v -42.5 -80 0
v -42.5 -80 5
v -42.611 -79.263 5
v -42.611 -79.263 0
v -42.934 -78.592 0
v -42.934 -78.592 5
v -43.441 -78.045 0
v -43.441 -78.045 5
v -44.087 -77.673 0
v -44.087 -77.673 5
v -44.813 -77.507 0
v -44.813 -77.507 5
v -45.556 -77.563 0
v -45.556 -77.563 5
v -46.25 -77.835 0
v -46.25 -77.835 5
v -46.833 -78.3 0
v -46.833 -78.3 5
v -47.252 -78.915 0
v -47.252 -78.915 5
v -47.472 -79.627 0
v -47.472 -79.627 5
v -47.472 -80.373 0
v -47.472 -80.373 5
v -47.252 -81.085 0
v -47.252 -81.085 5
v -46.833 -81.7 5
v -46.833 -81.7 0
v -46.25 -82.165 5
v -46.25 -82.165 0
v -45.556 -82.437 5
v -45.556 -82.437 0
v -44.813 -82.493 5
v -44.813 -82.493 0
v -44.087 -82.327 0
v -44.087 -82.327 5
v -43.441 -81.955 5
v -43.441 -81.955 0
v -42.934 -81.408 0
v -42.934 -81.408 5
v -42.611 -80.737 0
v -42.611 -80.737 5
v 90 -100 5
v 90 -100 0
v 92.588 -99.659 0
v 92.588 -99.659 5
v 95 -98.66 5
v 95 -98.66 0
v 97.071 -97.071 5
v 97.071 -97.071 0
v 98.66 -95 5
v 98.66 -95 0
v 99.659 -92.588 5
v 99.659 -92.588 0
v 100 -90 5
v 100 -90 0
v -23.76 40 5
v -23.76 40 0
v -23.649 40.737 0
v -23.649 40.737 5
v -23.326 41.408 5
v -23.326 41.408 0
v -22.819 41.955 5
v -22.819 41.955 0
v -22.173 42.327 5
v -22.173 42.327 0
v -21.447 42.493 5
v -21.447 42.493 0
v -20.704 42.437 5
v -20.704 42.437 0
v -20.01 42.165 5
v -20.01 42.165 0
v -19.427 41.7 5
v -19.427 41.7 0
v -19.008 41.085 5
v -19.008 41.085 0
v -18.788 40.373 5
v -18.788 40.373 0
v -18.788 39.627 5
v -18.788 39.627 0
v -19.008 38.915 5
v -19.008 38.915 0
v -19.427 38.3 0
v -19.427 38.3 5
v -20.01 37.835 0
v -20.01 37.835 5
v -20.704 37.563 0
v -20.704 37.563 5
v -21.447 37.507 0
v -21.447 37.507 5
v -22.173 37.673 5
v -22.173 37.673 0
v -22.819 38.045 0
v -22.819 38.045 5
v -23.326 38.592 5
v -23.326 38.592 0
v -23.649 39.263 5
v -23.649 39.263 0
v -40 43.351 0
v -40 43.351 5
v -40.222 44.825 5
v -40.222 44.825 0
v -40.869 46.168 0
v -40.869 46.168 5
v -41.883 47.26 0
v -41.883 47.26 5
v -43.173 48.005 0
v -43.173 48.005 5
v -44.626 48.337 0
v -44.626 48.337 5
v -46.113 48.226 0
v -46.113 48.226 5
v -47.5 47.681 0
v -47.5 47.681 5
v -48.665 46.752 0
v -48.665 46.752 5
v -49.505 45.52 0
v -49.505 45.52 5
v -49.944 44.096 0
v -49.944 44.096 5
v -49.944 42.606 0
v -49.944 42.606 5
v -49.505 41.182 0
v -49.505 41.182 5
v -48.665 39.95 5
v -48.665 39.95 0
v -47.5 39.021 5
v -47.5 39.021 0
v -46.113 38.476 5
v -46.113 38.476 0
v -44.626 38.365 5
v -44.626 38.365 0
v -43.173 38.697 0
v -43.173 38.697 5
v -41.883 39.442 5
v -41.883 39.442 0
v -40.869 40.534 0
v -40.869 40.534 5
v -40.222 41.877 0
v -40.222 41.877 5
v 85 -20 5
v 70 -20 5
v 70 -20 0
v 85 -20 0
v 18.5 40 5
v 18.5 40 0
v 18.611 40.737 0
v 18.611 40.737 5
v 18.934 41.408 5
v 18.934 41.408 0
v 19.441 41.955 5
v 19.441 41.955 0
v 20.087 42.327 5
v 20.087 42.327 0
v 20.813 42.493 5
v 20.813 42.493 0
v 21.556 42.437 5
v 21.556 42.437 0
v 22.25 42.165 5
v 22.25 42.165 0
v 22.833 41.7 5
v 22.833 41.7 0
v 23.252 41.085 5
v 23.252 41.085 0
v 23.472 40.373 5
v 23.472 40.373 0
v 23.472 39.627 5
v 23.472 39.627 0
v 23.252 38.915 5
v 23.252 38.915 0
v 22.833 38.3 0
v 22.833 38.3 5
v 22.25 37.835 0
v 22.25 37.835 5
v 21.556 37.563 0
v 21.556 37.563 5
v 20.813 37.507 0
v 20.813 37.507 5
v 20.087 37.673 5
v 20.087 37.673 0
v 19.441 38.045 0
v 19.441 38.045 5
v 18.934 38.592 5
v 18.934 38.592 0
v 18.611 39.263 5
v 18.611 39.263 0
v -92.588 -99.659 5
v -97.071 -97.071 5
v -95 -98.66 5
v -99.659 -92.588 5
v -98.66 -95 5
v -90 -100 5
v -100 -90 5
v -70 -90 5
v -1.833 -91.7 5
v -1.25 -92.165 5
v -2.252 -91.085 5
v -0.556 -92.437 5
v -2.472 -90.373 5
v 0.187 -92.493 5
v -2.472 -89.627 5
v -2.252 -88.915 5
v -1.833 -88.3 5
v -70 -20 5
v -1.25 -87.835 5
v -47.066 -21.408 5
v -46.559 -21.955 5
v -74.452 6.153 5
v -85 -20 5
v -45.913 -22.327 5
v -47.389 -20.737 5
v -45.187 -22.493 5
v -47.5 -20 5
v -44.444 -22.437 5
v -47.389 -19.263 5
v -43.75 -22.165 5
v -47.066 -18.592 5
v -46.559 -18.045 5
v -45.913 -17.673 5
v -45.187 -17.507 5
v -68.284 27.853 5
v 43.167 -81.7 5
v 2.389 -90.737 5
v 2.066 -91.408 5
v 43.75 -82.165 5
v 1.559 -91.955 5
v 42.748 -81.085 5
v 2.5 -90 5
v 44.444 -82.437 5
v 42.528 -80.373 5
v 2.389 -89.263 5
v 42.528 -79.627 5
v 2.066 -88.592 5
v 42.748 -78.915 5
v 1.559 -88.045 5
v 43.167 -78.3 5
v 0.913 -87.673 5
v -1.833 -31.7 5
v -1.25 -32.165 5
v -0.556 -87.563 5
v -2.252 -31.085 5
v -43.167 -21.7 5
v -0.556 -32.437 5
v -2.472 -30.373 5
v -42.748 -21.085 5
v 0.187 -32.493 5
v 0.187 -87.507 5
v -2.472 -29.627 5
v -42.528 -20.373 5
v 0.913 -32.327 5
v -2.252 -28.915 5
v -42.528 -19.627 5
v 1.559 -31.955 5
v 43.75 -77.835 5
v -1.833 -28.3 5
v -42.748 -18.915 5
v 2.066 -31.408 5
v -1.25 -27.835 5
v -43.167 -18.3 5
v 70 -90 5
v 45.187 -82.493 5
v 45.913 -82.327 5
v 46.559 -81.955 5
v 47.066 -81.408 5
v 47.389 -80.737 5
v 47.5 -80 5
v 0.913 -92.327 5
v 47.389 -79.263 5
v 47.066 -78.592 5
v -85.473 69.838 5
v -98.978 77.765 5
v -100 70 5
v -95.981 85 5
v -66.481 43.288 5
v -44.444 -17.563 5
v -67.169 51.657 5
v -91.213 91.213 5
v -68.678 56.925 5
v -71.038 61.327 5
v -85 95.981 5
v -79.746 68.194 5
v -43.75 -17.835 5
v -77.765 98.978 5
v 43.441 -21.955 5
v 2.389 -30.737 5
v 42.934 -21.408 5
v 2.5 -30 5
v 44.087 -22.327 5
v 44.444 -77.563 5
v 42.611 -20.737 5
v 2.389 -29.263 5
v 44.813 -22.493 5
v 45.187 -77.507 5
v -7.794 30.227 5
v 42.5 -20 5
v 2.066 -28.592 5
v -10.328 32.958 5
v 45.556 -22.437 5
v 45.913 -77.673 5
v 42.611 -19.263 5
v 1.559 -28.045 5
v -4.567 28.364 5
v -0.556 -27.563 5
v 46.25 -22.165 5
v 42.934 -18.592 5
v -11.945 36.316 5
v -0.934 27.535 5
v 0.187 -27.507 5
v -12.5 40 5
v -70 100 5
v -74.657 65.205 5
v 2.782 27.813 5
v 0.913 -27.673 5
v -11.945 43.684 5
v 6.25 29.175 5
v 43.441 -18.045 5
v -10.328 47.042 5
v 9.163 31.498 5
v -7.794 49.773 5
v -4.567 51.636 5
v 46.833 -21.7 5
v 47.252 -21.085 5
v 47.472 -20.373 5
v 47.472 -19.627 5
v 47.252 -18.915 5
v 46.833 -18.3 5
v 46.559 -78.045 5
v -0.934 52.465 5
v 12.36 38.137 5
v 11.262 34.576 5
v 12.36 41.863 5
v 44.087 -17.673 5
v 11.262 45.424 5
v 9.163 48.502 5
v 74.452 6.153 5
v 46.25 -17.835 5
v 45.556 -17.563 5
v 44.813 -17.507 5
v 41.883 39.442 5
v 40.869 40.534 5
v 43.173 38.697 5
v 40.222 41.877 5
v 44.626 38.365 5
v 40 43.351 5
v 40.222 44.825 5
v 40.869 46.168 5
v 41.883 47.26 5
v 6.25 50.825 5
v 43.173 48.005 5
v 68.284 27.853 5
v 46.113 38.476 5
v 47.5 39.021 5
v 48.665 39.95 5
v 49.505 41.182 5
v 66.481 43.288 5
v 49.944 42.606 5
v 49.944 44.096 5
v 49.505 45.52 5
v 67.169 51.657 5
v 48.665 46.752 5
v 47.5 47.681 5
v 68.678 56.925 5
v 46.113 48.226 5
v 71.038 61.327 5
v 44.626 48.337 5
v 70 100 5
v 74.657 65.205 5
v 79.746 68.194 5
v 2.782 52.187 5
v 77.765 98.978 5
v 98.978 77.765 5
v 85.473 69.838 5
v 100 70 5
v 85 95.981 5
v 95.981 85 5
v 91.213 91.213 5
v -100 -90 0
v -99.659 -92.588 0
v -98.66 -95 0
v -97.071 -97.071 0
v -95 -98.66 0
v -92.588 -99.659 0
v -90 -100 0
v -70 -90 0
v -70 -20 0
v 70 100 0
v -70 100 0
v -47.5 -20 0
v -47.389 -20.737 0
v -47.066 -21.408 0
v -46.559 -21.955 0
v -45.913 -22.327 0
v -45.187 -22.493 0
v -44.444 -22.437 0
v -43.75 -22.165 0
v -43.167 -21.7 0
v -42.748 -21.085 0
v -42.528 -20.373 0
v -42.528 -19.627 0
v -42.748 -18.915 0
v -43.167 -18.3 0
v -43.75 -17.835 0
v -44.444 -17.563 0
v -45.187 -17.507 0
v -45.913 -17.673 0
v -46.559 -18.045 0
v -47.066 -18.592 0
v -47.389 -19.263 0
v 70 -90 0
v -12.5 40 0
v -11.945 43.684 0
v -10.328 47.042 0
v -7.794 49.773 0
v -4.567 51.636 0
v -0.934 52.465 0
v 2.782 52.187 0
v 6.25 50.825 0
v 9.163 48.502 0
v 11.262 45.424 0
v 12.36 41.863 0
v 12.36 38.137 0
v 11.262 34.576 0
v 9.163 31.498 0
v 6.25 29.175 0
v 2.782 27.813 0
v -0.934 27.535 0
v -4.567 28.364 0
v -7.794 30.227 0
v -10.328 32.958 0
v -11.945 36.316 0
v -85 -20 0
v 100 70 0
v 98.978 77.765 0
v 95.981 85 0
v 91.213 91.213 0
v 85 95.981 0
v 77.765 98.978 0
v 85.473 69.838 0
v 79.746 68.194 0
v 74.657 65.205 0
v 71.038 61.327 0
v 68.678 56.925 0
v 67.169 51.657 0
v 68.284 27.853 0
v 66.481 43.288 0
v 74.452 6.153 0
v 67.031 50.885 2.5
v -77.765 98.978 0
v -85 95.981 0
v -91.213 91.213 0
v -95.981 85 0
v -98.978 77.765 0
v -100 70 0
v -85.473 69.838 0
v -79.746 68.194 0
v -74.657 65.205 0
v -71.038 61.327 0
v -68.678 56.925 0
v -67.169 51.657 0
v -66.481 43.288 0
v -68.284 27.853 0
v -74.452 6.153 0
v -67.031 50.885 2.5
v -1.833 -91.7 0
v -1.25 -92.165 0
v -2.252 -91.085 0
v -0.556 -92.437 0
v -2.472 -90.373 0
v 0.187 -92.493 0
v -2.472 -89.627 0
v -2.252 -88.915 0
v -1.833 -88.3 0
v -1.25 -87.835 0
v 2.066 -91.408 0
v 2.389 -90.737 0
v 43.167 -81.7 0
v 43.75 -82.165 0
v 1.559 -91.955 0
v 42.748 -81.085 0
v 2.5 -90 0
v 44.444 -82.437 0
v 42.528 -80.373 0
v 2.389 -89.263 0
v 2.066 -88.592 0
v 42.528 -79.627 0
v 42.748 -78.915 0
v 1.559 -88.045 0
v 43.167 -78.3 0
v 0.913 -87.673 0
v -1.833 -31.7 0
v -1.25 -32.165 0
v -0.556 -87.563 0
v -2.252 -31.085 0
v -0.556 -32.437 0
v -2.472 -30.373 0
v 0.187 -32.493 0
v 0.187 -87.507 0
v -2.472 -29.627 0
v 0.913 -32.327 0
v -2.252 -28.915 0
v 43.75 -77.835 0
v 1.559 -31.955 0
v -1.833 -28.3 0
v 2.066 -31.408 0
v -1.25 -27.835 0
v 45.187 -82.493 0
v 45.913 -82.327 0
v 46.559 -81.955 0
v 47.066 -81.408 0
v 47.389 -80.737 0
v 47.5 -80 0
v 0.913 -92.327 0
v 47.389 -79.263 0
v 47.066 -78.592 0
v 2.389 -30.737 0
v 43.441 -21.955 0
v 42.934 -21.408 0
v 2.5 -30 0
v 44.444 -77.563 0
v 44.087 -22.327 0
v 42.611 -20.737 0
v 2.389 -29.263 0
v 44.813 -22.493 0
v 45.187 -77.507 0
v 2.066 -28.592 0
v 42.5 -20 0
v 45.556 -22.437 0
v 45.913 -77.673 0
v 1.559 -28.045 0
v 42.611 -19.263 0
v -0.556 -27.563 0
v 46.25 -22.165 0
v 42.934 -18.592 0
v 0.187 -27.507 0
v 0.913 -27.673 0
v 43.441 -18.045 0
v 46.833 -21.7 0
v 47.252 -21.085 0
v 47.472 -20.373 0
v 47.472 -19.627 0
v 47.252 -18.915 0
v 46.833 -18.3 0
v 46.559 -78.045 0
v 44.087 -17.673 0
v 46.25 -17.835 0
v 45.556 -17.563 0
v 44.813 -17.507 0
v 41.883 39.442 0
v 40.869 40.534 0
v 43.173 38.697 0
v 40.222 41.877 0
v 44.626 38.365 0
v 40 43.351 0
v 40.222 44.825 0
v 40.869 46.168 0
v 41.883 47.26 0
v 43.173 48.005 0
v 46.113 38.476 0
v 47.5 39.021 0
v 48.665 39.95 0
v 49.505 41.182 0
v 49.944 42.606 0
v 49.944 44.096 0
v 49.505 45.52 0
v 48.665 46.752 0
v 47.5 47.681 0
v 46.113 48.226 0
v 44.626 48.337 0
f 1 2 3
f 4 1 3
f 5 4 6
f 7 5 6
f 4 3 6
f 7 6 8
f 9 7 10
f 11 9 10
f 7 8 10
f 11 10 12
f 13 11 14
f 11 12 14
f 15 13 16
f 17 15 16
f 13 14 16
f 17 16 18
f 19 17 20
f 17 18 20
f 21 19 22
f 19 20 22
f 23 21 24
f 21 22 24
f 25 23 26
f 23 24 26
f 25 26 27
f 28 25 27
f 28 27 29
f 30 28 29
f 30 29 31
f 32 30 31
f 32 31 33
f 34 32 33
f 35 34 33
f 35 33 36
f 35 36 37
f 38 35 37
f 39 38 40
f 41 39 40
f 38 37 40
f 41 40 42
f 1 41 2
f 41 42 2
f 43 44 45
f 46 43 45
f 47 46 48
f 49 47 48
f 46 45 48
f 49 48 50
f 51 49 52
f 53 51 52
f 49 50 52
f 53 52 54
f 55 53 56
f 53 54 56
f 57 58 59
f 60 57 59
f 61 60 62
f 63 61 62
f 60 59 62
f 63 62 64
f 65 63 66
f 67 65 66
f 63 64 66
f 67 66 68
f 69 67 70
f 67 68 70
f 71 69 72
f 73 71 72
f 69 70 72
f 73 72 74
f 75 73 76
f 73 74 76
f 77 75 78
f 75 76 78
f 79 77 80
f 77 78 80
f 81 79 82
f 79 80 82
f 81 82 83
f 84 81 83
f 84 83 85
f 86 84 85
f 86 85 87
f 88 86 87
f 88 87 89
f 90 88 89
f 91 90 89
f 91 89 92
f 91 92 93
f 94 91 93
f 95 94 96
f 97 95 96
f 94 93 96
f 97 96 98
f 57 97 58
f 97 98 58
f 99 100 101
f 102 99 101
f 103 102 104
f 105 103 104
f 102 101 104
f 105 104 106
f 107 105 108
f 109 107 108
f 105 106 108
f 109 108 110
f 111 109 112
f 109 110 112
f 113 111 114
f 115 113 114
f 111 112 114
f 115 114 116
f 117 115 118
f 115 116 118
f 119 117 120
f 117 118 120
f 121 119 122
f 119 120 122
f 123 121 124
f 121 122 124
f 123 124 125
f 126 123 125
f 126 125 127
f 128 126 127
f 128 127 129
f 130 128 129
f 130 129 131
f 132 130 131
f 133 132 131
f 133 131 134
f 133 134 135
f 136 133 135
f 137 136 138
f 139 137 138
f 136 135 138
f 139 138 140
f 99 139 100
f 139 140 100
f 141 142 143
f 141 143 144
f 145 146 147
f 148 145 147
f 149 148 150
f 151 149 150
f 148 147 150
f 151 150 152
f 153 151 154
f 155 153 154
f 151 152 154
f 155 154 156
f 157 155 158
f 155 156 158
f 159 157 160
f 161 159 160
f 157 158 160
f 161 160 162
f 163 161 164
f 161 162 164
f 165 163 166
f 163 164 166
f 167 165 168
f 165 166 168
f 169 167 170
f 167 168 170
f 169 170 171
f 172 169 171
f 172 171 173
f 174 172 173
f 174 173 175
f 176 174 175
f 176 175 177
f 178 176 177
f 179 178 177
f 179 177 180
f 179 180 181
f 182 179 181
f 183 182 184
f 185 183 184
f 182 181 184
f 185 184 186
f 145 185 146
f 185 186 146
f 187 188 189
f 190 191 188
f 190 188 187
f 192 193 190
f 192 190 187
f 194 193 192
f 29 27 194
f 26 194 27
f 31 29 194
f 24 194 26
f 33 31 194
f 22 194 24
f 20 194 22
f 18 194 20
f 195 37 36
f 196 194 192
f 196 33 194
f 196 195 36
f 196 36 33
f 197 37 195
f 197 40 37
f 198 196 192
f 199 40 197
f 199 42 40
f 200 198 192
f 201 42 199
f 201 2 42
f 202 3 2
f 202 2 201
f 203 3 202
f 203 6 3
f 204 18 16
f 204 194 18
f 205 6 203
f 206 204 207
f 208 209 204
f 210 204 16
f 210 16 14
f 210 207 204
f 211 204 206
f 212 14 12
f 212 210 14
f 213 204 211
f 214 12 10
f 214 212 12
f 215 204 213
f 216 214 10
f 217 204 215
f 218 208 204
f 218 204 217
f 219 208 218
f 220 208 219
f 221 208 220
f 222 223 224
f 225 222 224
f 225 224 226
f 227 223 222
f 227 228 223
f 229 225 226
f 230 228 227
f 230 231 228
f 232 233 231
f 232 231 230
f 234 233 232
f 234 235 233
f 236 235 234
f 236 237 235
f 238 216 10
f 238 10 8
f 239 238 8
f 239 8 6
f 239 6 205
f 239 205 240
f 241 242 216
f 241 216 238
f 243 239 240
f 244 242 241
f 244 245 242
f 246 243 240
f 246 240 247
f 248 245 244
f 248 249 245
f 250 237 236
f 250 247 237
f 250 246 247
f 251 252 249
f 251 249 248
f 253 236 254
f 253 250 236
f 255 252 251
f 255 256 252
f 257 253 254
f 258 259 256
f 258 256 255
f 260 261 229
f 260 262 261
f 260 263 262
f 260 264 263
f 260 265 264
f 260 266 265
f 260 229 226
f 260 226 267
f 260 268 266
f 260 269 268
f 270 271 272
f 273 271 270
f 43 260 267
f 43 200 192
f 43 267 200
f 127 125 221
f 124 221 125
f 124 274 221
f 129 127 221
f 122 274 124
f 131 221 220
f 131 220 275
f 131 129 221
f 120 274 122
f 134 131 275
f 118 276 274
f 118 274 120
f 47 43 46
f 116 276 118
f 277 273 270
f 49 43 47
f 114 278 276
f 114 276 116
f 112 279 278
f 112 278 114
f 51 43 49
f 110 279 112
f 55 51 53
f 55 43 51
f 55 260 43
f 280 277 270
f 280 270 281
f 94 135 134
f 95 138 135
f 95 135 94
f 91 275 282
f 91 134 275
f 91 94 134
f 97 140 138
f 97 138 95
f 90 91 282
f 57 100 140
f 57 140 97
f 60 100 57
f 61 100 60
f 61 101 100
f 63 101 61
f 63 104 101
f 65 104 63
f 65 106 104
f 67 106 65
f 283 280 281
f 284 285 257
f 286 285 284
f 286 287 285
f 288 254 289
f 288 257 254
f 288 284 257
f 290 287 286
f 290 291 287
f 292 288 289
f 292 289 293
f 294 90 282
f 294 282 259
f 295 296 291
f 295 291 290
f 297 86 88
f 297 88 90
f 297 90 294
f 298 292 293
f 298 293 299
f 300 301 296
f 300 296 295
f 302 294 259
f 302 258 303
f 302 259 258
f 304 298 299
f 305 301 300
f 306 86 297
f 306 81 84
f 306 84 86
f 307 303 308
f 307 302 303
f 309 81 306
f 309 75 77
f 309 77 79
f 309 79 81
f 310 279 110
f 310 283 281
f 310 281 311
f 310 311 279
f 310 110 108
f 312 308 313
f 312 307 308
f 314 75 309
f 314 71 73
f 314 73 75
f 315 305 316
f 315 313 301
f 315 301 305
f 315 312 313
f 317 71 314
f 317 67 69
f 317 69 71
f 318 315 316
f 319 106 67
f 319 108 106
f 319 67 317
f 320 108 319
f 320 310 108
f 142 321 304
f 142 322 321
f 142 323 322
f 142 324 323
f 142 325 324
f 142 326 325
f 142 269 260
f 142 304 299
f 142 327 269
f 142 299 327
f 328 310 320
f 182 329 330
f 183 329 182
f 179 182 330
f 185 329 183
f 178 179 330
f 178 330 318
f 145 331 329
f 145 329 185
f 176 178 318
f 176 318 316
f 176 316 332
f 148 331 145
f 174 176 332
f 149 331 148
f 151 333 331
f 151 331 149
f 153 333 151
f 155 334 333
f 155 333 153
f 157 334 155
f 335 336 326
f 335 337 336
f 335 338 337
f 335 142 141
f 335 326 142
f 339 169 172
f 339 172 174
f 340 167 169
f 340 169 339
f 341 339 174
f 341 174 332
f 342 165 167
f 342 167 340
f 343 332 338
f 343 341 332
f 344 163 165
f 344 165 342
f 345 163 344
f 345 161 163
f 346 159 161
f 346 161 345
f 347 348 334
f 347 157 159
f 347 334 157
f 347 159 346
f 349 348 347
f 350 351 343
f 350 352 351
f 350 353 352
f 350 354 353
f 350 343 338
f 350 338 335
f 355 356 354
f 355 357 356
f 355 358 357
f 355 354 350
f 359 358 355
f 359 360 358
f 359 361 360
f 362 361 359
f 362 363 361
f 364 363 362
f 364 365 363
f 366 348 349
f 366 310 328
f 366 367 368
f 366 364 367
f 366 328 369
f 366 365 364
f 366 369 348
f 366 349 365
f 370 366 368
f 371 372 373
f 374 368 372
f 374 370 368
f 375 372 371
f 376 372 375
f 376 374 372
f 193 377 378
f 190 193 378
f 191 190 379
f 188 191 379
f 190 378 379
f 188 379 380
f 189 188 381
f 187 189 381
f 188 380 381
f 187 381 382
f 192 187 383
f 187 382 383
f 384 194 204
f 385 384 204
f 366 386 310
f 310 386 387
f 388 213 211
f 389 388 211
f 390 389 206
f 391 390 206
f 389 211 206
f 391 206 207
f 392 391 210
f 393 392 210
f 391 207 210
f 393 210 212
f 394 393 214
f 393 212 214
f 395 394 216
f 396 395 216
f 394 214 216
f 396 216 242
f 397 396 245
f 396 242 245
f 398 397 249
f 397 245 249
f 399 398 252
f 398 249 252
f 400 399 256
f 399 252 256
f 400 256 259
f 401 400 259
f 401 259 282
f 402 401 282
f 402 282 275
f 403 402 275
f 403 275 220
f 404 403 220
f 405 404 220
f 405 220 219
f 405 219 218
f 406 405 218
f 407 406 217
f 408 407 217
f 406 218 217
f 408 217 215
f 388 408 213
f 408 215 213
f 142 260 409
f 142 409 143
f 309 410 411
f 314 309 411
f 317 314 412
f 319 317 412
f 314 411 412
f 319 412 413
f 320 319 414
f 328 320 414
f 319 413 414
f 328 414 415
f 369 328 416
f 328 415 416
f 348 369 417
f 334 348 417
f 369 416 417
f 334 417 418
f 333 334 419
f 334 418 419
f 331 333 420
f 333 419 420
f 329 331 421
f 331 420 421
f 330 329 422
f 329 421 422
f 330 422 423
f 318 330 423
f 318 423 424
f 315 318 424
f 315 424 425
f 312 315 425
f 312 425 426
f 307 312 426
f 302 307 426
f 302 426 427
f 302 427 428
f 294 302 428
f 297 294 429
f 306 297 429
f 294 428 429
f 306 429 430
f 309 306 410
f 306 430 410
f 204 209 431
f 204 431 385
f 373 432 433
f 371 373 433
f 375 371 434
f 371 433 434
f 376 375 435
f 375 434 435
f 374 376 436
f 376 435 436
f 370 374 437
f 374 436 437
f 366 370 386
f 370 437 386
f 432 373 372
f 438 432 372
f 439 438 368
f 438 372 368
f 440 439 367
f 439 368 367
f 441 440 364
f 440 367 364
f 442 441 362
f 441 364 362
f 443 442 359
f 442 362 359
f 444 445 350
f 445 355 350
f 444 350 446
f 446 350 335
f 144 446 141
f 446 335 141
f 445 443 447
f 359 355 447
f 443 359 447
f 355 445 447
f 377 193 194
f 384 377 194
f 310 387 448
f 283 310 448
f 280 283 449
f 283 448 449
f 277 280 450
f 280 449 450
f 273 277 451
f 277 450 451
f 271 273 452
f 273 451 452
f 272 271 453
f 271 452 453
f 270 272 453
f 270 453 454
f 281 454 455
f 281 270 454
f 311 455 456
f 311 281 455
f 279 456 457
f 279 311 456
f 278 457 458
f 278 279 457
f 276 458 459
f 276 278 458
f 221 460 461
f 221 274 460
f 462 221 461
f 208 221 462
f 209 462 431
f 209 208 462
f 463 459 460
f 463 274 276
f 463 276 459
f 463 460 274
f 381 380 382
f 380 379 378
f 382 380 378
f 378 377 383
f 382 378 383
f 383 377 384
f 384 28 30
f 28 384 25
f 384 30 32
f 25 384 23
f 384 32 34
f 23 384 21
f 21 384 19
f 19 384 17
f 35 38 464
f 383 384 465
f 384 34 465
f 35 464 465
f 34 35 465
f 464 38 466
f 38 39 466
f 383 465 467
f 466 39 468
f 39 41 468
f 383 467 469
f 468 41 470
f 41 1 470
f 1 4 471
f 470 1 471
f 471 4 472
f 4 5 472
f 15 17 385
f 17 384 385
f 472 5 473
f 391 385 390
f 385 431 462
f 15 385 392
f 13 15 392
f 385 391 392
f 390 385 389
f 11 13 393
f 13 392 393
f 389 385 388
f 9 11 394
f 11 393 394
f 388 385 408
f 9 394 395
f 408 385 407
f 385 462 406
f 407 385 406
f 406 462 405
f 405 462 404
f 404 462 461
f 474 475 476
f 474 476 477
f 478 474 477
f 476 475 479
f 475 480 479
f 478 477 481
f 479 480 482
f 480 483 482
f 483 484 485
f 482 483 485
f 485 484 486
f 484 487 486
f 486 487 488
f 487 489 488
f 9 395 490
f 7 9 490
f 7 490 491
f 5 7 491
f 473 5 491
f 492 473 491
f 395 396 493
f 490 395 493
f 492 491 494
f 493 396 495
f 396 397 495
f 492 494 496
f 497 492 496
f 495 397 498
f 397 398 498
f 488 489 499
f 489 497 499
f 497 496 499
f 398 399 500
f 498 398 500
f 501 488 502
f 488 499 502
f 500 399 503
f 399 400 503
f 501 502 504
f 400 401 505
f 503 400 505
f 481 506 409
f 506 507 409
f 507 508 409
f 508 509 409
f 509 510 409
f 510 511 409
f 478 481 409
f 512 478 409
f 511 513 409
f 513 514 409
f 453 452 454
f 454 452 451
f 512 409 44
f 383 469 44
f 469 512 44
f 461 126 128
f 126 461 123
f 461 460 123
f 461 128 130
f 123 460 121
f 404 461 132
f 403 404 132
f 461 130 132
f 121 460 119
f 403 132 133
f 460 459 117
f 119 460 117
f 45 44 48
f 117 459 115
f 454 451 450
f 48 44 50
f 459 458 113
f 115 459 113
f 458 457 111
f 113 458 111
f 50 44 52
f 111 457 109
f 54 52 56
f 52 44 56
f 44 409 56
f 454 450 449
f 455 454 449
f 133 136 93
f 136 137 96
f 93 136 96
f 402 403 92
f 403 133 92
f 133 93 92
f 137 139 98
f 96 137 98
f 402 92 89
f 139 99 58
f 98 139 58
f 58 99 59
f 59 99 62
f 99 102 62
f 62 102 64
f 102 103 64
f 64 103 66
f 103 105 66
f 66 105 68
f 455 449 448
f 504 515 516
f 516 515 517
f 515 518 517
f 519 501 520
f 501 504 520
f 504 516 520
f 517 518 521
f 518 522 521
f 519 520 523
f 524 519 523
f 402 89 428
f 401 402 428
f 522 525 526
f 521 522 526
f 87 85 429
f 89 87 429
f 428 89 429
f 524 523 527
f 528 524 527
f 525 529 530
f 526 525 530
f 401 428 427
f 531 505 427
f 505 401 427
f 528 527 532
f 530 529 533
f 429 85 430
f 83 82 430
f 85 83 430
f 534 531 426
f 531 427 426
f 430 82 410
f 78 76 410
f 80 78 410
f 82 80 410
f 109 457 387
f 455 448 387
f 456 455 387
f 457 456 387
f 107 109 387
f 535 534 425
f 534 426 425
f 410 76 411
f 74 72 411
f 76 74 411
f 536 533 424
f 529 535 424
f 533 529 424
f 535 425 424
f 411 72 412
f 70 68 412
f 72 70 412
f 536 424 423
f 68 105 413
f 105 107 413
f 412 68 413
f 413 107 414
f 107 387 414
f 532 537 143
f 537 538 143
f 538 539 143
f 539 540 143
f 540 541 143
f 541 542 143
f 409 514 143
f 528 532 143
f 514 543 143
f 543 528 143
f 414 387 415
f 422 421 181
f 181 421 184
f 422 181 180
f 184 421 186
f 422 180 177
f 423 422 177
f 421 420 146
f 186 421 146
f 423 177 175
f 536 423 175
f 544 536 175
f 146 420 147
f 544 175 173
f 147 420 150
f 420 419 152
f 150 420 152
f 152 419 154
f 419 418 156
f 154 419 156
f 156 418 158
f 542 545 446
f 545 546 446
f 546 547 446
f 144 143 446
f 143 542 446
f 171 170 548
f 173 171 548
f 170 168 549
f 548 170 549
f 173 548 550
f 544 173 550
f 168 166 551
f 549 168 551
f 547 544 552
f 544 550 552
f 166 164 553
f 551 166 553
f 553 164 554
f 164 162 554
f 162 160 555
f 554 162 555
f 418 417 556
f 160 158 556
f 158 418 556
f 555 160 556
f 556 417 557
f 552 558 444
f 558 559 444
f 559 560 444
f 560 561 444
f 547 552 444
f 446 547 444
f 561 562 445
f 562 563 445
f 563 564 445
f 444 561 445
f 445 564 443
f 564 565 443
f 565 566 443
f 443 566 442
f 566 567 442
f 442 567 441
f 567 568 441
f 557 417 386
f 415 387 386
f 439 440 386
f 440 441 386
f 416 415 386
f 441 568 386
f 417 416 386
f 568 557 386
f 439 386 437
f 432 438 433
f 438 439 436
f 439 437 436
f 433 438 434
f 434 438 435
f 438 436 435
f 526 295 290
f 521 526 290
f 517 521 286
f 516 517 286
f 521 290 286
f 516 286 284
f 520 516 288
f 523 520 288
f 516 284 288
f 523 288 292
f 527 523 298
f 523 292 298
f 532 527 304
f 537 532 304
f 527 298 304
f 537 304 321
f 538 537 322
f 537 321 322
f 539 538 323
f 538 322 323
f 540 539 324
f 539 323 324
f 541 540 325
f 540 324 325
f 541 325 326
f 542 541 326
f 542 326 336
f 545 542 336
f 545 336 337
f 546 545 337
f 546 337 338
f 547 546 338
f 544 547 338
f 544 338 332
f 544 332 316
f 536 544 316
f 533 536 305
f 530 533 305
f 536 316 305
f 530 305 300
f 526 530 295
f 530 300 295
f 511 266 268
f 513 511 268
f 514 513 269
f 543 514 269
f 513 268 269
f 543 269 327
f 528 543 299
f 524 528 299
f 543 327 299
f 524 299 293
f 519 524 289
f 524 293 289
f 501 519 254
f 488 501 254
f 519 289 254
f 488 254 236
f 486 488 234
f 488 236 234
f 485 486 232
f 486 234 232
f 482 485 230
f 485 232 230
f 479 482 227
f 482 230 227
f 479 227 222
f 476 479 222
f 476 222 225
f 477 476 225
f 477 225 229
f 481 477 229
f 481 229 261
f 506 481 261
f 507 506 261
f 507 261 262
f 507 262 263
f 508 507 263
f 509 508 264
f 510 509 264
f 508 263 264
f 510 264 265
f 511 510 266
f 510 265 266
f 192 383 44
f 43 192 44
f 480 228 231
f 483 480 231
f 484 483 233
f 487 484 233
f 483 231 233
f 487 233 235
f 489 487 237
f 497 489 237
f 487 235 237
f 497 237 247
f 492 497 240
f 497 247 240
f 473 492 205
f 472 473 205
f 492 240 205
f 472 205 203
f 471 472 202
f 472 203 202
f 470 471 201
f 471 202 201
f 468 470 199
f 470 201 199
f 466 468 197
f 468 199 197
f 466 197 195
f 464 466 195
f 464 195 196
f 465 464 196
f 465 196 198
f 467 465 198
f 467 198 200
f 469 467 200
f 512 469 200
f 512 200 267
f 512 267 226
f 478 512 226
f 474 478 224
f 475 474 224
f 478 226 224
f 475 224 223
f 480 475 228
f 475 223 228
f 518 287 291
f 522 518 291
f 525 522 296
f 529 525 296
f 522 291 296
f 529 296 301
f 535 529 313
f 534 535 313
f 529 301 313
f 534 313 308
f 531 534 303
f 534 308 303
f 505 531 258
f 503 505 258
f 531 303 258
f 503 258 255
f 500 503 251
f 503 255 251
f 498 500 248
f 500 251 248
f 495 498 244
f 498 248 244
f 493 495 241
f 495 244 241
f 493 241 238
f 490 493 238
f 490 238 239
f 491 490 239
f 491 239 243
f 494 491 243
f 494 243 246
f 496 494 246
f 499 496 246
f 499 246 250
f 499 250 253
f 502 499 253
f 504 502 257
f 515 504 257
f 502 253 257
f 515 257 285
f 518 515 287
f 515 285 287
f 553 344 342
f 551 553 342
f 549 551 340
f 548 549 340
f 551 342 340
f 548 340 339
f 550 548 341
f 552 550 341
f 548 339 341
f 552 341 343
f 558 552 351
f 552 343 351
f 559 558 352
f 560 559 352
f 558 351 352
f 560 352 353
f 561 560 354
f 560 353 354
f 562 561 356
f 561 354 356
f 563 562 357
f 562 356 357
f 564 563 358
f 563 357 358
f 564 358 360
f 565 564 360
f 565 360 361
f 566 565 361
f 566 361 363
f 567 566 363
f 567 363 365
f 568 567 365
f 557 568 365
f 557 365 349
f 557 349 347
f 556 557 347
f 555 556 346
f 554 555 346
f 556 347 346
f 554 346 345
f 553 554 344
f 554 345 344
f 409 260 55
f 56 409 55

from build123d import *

# Parameters (mm, degrees)
BOSS_EXTRUDE1_DEPTH = 5
SKETCH2_W           = 30
SKETCH2_H           = 70
CUT_EXTRUDE1_DEPTH  = 5
CUT_EXTRUDE2_DEPTH  = 5
SKETCH5_R           = 2.5
SKETCH5_R_2         = 5
CUT_EXTRUDE3_DEPTH  = 5
SKETCH6_R           = 2.5
CUT_EXTRUDE4_DEPTH  = 5
SKETCH7_R           = 12.5
SKETCH7_R_2         = 2.5
CUT_EXTRUDE5_DEPTH  = 5


with BuildPart() as part:
    # Sketch1 → Boss-Extrude1 (new body)
    with BuildSketch(Plane.XY):
        with BuildLine():
            Line((-90, -100), (90, -100))
            ThreePointArc((90, -100), (97.071067812, -97.071067812), (100, -90))
            Line((100, -90), (100, 70))
            ThreePointArc((100, 70), (91.213203436, 91.213203436), (70, 100))
            Line((70, 100), (-70, 100))
            ThreePointArc((-70, 100), (-91.213203436, 91.213203436), (-100, 70))
            Line((-100, 70), (-100, -90))
            ThreePointArc((-100, -90), (-97.071067812, -97.071067812), (-90, -100))
        make_face()
    extrude(amount=BOSS_EXTRUDE1_DEPTH)

    # Sketch2 → Cut-Extrude1 (cut)
    with BuildSketch(Plane.XY.offset(5)):
        with Locations((85, -55)):
            Rectangle(SKETCH2_W, SKETCH2_H)
        with Locations((-85, -55)):
            Rectangle(SKETCH2_W, SKETCH2_H)
    extrude(amount=-CUT_EXTRUDE1_DEPTH, mode=Mode.SUBTRACT)

    # Sketch3 → Cut-Extrude2 (cut)
    with BuildSketch(Plane.XY.offset(5)):
        with BuildLine():
            Line((85, -20), (100, -20))
            Line((100, -20), (100, 70))
            add(Edge.make_bspline(
                [(100, 70), (41.562750789, 76.769648156), (85, -20)],
                knots=[0, 0, 0, 1, 1, 1], degree=2))
        make_face()
        with BuildLine():
            Line((-85, -20), (-100, -20))
            Line((-100, -20), (-100, 70))
            add(Edge.make_bspline(
                [(-100, 70), (-41.562750789, 76.769648156), (-85, -20)],
                knots=[0, 0, 0, 1, 1, 1], degree=2))
        make_face()
    extrude(amount=-CUT_EXTRUDE2_DEPTH, mode=Mode.SUBTRACT)

    # Sketch5 → Cut-Extrude3 (cut)
    with BuildSketch(Plane.XY.offset(5)):
        with Locations((45, -80)):
            Circle(SKETCH5_R)
        with Locations((-45, -80)):
            Circle(SKETCH5_R)
        with Locations(Location((45, -20, 0), (0, 0, 180))):
            Circle(SKETCH5_R)
        with Locations(Location((-45, -20, 0), (0, 0, 180))):
            Circle(SKETCH5_R)
        with Locations((-45, 43.350998567)):
            Circle(SKETCH5_R_2)
        with Locations(Location((45, 43.350998567, 0), (0, 0, 180))):
            Circle(SKETCH5_R_2)
        with Locations((0, -30)):
            Circle(SKETCH5_R)
    extrude(amount=-CUT_EXTRUDE3_DEPTH, mode=Mode.SUBTRACT)

    # Sketch6 → Cut-Extrude4 (cut)
    with BuildSketch(Plane.XY.offset(5)):
        with Locations((0, -90)):
            Circle(SKETCH6_R)
    extrude(amount=-CUT_EXTRUDE4_DEPTH, mode=Mode.SUBTRACT)

    # Sketch7 → Cut-Extrude5 (cut)
    with BuildSketch(Plane(origin=(0, 0, 0), x_dir=(-1, 0, 0), z_dir=(0, 0, -1))):
        with Locations((0, 40)):
            Circle(SKETCH7_R)
        with Locations((-21, 40)):
            Circle(SKETCH7_R_2)
        with Locations((21.26, 40)):
            Circle(SKETCH7_R_2)
    extrude(amount=-CUT_EXTRUDE5_DEPTH, mode=Mode.SUBTRACT)


solid = part.part
